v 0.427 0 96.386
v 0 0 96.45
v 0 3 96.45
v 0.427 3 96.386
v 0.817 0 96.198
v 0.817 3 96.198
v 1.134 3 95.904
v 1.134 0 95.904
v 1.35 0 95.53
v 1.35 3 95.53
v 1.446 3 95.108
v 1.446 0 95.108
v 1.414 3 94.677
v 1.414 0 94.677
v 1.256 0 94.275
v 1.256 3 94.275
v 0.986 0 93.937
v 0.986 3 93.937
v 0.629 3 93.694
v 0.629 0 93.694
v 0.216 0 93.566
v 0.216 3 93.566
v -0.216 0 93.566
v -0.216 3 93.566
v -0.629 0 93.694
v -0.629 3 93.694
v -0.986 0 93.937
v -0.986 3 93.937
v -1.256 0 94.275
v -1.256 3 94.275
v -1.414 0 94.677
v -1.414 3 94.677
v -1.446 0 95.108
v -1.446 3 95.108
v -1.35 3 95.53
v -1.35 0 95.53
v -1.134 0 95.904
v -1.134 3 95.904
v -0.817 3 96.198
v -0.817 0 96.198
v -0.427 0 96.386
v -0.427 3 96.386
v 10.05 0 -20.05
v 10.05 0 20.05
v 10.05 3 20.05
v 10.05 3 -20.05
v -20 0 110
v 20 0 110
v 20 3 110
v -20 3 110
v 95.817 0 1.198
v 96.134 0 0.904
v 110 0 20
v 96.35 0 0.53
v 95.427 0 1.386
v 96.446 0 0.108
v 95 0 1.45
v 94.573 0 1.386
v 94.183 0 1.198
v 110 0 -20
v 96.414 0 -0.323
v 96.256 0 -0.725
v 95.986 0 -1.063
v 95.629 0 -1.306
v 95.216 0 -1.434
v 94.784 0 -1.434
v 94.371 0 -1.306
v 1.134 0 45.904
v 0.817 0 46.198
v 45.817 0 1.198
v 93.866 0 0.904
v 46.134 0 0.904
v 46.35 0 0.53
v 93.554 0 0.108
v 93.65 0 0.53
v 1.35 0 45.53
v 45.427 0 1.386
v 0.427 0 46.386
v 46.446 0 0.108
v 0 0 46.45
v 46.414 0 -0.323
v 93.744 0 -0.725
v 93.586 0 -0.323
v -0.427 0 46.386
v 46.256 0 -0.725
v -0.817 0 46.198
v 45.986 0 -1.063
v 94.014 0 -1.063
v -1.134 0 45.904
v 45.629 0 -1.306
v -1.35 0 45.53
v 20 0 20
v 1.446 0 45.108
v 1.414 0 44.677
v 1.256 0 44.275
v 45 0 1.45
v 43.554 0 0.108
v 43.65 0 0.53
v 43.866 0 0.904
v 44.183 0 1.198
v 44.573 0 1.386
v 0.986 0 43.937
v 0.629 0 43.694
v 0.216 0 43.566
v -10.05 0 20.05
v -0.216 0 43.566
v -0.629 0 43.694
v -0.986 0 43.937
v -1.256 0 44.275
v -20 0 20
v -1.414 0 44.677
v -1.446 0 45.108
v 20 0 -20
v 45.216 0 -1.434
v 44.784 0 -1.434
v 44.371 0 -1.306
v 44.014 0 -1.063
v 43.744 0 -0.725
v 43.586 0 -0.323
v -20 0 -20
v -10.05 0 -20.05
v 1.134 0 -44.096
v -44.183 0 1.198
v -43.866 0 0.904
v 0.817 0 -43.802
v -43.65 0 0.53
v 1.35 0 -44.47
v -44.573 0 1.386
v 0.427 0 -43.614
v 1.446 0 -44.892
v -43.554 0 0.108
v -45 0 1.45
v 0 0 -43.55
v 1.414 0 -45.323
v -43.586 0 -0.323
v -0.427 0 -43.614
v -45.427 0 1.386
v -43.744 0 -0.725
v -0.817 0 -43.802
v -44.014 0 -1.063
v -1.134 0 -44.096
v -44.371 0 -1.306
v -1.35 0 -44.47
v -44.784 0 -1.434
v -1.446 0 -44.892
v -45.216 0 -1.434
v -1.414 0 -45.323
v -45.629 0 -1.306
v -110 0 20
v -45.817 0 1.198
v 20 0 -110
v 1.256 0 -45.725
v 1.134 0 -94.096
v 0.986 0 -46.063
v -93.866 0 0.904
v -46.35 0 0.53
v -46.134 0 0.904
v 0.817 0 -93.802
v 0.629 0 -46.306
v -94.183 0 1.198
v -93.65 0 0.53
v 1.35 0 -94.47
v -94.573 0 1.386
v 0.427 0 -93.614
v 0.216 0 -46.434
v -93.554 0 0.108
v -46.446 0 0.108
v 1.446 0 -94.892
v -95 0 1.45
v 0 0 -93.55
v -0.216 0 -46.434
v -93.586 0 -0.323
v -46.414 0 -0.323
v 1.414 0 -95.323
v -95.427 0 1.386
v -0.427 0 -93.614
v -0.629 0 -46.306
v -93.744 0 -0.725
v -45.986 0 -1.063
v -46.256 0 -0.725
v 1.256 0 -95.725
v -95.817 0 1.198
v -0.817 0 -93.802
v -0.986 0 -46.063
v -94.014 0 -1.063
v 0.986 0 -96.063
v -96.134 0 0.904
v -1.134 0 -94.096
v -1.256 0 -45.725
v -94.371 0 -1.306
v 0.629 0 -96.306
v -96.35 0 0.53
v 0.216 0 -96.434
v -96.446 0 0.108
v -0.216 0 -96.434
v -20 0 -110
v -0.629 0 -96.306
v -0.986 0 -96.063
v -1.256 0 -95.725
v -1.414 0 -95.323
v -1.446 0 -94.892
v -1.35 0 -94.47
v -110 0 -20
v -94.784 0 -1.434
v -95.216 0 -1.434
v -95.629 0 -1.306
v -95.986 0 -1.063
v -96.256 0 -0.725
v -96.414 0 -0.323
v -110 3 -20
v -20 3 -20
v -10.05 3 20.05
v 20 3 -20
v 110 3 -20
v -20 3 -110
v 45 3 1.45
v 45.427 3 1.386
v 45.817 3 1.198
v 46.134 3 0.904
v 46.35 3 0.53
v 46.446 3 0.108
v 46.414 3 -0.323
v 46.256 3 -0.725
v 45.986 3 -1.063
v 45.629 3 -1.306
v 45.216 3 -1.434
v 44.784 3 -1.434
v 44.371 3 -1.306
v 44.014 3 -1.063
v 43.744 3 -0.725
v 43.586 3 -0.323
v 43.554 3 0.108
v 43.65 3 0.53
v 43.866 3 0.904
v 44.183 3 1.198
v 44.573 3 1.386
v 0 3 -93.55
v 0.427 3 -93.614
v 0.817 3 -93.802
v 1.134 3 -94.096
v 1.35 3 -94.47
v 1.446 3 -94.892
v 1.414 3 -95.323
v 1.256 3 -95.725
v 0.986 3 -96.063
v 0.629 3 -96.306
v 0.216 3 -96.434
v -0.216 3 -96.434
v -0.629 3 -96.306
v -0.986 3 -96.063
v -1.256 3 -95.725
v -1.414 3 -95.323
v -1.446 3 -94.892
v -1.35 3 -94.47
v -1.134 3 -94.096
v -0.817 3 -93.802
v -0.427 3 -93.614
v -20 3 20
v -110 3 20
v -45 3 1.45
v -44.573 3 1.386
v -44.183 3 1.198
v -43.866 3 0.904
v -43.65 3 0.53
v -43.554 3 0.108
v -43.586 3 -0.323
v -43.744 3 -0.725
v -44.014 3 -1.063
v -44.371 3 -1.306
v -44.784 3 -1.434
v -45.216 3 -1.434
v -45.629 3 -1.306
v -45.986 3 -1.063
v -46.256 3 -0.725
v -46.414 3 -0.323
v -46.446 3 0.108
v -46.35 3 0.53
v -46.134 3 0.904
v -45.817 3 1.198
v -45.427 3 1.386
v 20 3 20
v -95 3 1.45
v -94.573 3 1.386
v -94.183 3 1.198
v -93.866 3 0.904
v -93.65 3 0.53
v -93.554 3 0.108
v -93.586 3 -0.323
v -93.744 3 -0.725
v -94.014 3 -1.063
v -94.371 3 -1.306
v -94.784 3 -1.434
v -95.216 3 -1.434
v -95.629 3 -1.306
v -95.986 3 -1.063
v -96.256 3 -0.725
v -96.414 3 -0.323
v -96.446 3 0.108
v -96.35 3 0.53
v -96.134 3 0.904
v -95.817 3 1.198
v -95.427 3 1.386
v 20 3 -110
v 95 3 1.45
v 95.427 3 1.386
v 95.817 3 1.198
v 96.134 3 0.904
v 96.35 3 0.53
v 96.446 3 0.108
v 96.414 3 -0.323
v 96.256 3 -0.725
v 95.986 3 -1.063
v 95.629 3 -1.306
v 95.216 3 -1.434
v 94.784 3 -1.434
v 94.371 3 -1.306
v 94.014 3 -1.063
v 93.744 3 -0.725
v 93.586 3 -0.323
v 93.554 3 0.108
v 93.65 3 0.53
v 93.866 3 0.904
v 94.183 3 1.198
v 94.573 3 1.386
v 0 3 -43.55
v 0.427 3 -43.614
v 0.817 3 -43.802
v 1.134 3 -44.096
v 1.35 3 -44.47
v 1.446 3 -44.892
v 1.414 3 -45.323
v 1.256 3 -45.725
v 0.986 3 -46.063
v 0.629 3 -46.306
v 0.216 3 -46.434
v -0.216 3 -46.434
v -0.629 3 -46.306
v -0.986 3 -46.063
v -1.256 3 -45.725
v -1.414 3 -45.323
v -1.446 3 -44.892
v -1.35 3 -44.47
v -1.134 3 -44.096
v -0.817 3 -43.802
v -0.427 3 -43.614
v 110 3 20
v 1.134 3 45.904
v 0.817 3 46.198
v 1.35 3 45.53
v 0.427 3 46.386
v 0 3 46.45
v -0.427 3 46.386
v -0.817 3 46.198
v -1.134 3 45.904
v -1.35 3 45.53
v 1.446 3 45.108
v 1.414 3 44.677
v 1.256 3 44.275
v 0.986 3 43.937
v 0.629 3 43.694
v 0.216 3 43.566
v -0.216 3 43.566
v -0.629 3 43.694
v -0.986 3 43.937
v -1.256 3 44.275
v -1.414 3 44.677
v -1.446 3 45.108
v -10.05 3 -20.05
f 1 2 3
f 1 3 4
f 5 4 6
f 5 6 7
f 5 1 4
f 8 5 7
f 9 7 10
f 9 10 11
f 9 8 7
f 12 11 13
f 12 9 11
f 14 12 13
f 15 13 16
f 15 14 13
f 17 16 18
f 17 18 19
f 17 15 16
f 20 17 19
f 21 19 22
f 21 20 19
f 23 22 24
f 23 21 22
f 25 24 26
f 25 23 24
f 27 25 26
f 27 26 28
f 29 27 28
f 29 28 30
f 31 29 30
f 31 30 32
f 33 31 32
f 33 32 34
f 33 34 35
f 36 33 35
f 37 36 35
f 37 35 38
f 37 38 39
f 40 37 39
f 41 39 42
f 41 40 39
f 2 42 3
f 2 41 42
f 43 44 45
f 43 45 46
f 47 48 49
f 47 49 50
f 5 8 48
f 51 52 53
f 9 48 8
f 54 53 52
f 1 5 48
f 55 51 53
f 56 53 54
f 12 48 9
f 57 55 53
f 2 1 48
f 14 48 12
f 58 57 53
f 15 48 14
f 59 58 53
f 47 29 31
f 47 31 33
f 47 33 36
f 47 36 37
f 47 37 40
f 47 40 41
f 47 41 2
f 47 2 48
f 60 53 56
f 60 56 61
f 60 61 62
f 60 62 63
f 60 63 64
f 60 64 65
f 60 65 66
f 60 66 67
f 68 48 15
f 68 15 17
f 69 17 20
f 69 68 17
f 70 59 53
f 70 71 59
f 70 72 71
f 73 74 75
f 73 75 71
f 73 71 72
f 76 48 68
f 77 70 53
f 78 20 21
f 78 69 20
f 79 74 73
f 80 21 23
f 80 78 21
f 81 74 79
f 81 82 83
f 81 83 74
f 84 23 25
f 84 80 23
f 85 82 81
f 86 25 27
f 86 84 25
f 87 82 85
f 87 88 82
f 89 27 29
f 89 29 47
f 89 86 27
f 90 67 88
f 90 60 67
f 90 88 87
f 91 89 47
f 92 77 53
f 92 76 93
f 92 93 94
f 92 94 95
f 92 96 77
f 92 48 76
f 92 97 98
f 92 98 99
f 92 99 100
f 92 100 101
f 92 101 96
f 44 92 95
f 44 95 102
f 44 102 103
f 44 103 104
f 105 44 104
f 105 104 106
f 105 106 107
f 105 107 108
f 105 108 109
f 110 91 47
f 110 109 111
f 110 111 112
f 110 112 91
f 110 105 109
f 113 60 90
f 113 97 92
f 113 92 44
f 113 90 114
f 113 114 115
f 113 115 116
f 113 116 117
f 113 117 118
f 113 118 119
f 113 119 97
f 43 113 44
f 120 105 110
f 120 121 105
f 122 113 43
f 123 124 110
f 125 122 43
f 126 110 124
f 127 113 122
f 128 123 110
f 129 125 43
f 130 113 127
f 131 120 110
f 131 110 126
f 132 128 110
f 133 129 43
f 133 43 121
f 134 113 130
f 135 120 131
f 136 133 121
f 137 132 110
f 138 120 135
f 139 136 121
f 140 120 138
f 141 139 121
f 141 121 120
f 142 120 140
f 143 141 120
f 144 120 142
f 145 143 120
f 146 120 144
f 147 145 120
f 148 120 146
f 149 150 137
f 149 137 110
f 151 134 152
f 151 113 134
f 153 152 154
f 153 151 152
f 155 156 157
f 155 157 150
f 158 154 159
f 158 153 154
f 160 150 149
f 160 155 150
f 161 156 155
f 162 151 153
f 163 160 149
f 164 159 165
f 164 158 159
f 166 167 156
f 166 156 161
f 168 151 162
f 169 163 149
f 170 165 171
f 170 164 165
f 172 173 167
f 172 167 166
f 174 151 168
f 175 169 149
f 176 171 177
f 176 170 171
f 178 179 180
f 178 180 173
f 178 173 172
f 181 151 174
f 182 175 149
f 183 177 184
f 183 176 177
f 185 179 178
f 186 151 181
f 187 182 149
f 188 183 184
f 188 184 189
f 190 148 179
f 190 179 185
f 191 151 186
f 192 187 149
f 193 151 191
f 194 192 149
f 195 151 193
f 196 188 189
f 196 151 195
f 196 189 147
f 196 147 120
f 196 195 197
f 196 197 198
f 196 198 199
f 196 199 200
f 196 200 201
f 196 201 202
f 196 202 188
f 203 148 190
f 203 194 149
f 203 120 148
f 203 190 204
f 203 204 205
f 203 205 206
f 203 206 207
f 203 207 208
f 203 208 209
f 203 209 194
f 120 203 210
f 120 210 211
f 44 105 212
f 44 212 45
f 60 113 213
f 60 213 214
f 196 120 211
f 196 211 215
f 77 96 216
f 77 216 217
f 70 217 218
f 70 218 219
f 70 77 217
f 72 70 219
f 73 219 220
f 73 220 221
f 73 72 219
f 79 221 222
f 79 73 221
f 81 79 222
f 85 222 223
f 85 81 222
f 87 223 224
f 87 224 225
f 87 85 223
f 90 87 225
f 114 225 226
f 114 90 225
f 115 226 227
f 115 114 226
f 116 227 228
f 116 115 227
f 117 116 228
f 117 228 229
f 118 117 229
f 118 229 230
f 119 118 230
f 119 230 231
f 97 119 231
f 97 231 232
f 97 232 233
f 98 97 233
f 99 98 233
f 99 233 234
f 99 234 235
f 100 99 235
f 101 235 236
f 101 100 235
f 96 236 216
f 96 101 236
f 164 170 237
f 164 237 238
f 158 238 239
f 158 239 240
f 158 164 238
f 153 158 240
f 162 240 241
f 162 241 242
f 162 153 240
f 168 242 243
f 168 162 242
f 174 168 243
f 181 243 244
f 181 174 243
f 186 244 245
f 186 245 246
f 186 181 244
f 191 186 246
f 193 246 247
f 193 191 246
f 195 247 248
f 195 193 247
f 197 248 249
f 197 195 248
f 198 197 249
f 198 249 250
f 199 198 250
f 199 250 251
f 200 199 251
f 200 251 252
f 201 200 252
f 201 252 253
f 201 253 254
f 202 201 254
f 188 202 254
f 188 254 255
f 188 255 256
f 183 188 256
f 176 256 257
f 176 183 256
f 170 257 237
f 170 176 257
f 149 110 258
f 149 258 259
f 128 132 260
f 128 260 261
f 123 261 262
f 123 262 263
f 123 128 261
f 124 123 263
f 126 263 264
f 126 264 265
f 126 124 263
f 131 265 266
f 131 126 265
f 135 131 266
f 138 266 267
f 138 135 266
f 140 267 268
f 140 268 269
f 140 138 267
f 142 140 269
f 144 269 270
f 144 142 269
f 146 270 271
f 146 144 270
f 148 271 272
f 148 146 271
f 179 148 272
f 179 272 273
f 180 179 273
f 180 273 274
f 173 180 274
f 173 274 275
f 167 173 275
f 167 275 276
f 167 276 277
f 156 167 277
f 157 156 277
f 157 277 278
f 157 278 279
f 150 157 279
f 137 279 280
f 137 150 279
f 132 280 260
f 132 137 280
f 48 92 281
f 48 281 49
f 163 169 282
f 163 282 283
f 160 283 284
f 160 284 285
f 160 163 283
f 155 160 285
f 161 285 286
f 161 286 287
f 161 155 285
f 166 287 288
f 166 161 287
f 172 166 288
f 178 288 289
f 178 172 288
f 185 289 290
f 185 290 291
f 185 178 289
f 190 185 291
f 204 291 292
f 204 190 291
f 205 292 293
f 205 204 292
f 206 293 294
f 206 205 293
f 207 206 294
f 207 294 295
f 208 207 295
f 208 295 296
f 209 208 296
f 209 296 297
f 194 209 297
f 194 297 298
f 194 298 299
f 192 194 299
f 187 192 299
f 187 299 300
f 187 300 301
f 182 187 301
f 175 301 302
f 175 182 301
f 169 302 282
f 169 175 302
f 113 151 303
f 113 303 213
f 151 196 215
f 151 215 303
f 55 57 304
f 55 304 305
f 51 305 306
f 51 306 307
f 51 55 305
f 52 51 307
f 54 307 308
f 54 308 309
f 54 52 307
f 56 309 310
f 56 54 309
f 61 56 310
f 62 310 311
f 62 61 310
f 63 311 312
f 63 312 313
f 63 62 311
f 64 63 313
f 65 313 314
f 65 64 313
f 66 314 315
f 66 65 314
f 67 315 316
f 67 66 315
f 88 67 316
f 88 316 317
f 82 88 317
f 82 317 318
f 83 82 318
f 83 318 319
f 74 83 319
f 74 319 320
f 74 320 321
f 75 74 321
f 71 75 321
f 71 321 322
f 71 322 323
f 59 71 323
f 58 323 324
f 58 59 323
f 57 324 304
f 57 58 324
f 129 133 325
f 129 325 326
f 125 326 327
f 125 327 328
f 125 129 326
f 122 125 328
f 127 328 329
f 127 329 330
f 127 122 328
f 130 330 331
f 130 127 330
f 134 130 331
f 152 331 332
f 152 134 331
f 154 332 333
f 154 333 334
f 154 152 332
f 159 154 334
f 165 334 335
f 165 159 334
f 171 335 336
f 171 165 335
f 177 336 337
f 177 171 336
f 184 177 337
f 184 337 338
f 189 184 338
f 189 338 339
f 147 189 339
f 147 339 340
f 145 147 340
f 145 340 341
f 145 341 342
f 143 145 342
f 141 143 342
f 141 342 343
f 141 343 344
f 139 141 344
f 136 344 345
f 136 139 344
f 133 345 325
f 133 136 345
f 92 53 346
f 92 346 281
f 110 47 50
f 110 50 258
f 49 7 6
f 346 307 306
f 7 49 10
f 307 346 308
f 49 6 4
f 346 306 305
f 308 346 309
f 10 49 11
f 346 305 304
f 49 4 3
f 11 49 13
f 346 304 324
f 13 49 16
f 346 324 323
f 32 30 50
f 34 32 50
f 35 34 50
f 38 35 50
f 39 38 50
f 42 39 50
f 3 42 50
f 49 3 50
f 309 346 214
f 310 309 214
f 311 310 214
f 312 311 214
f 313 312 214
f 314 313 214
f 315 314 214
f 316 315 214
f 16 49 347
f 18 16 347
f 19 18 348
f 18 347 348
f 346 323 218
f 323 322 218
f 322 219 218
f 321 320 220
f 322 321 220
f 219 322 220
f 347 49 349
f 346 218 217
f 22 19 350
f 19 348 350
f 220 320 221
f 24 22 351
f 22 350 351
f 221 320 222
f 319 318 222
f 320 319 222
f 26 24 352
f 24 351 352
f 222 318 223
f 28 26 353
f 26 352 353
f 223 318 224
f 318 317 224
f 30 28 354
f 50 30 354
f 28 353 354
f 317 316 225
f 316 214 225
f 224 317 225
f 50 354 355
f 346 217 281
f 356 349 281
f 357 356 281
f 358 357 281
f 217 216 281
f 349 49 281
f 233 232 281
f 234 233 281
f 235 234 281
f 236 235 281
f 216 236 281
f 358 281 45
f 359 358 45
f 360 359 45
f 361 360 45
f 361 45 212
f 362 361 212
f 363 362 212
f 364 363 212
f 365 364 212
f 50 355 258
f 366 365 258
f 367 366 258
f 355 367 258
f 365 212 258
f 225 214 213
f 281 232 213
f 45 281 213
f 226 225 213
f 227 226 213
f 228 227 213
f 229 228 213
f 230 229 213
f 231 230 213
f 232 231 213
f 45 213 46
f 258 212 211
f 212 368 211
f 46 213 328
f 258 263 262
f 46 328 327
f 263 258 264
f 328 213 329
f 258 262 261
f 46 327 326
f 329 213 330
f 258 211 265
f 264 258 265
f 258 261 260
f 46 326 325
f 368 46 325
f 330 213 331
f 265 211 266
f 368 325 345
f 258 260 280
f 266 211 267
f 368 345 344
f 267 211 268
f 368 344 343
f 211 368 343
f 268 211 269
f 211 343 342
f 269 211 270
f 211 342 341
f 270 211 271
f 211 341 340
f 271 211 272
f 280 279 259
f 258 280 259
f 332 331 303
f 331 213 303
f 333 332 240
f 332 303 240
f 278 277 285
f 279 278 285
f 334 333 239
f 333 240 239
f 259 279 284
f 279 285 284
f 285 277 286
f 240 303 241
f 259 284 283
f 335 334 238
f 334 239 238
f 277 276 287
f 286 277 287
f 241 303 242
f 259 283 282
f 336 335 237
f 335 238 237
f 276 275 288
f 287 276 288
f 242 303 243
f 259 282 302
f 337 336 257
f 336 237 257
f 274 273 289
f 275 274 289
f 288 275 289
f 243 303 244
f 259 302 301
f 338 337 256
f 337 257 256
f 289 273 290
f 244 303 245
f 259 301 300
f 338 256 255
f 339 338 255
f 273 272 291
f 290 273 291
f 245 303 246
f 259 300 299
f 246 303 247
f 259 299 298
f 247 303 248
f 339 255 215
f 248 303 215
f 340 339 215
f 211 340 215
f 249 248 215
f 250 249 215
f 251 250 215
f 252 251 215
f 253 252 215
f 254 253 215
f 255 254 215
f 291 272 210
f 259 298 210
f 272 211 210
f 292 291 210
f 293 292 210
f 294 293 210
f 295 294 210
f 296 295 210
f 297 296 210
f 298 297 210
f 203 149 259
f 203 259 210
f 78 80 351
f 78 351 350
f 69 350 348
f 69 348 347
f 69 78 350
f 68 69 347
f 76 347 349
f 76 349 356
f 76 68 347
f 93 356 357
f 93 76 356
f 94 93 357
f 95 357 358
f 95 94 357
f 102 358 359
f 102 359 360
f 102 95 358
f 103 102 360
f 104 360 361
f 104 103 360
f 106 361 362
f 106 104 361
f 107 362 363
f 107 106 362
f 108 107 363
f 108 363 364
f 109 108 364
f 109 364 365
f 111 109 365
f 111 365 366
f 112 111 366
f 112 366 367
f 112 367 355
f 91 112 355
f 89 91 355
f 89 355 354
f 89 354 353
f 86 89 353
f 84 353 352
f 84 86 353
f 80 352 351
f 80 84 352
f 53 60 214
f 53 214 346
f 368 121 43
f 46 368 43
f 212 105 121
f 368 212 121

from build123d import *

# Parameters (mm, degrees)
SKETCH1_R           = 1.45
SKETCH1_W           = 20.1
SKETCH1_H           = 40.1
BOSS_EXTRUDE1_DEPTH = 3


with BuildPart() as part:
    # Sketch1 → Boss-Extrude1 (new body)
    with BuildSketch(Plane(origin=(0, 0, 0), x_dir=(1, 0, 0), z_dir=(0, 1, 0))):
        Polygon((-20, 110), (20, 110), (20, 20), (110, 20), (110, -20), (20, -20), (20, -110), (-20, -110), (-20, -20), (-110, -20), (-110, 20), (-20, 20), align=None)
        with Locations(Location((45, 0, 0), (0, 0, 270))):
            Circle(SKETCH1_R, mode=Mode.SUBTRACT)
        with Locations(Location((95, 0, 0), (0, 0, 270))):
            Circle(SKETCH1_R, mode=Mode.SUBTRACT)
        with Locations(Location((-95, 0, 0), (0, 0, 270))):
            Circle(SKETCH1_R, mode=Mode.SUBTRACT)
        with Locations(Location((-45, 0, 0), (0, 0, 270))):
            Circle(SKETCH1_R, mode=Mode.SUBTRACT)
        with Locations(Location((0, 95, 0), (0, 0, 270))):
            Circle(SKETCH1_R, mode=Mode.SUBTRACT)
        with Locations(Location((0, 45, 0), (0, 0, 270))):
            Circle(SKETCH1_R, mode=Mode.SUBTRACT)
        with Locations(Location((0, -45, 0), (0, 0, 270))):
            Circle(SKETCH1_R, mode=Mode.SUBTRACT)
        with Locations(Location((0, -95, 0), (0, 0, 270))):
            Circle(SKETCH1_R, mode=Mode.SUBTRACT)
        Rectangle(SKETCH1_W, SKETCH1_H, mode=Mode.SUBTRACT)
    extrude(amount=BOSS_EXTRUDE1_DEPTH)


solid = part.part
